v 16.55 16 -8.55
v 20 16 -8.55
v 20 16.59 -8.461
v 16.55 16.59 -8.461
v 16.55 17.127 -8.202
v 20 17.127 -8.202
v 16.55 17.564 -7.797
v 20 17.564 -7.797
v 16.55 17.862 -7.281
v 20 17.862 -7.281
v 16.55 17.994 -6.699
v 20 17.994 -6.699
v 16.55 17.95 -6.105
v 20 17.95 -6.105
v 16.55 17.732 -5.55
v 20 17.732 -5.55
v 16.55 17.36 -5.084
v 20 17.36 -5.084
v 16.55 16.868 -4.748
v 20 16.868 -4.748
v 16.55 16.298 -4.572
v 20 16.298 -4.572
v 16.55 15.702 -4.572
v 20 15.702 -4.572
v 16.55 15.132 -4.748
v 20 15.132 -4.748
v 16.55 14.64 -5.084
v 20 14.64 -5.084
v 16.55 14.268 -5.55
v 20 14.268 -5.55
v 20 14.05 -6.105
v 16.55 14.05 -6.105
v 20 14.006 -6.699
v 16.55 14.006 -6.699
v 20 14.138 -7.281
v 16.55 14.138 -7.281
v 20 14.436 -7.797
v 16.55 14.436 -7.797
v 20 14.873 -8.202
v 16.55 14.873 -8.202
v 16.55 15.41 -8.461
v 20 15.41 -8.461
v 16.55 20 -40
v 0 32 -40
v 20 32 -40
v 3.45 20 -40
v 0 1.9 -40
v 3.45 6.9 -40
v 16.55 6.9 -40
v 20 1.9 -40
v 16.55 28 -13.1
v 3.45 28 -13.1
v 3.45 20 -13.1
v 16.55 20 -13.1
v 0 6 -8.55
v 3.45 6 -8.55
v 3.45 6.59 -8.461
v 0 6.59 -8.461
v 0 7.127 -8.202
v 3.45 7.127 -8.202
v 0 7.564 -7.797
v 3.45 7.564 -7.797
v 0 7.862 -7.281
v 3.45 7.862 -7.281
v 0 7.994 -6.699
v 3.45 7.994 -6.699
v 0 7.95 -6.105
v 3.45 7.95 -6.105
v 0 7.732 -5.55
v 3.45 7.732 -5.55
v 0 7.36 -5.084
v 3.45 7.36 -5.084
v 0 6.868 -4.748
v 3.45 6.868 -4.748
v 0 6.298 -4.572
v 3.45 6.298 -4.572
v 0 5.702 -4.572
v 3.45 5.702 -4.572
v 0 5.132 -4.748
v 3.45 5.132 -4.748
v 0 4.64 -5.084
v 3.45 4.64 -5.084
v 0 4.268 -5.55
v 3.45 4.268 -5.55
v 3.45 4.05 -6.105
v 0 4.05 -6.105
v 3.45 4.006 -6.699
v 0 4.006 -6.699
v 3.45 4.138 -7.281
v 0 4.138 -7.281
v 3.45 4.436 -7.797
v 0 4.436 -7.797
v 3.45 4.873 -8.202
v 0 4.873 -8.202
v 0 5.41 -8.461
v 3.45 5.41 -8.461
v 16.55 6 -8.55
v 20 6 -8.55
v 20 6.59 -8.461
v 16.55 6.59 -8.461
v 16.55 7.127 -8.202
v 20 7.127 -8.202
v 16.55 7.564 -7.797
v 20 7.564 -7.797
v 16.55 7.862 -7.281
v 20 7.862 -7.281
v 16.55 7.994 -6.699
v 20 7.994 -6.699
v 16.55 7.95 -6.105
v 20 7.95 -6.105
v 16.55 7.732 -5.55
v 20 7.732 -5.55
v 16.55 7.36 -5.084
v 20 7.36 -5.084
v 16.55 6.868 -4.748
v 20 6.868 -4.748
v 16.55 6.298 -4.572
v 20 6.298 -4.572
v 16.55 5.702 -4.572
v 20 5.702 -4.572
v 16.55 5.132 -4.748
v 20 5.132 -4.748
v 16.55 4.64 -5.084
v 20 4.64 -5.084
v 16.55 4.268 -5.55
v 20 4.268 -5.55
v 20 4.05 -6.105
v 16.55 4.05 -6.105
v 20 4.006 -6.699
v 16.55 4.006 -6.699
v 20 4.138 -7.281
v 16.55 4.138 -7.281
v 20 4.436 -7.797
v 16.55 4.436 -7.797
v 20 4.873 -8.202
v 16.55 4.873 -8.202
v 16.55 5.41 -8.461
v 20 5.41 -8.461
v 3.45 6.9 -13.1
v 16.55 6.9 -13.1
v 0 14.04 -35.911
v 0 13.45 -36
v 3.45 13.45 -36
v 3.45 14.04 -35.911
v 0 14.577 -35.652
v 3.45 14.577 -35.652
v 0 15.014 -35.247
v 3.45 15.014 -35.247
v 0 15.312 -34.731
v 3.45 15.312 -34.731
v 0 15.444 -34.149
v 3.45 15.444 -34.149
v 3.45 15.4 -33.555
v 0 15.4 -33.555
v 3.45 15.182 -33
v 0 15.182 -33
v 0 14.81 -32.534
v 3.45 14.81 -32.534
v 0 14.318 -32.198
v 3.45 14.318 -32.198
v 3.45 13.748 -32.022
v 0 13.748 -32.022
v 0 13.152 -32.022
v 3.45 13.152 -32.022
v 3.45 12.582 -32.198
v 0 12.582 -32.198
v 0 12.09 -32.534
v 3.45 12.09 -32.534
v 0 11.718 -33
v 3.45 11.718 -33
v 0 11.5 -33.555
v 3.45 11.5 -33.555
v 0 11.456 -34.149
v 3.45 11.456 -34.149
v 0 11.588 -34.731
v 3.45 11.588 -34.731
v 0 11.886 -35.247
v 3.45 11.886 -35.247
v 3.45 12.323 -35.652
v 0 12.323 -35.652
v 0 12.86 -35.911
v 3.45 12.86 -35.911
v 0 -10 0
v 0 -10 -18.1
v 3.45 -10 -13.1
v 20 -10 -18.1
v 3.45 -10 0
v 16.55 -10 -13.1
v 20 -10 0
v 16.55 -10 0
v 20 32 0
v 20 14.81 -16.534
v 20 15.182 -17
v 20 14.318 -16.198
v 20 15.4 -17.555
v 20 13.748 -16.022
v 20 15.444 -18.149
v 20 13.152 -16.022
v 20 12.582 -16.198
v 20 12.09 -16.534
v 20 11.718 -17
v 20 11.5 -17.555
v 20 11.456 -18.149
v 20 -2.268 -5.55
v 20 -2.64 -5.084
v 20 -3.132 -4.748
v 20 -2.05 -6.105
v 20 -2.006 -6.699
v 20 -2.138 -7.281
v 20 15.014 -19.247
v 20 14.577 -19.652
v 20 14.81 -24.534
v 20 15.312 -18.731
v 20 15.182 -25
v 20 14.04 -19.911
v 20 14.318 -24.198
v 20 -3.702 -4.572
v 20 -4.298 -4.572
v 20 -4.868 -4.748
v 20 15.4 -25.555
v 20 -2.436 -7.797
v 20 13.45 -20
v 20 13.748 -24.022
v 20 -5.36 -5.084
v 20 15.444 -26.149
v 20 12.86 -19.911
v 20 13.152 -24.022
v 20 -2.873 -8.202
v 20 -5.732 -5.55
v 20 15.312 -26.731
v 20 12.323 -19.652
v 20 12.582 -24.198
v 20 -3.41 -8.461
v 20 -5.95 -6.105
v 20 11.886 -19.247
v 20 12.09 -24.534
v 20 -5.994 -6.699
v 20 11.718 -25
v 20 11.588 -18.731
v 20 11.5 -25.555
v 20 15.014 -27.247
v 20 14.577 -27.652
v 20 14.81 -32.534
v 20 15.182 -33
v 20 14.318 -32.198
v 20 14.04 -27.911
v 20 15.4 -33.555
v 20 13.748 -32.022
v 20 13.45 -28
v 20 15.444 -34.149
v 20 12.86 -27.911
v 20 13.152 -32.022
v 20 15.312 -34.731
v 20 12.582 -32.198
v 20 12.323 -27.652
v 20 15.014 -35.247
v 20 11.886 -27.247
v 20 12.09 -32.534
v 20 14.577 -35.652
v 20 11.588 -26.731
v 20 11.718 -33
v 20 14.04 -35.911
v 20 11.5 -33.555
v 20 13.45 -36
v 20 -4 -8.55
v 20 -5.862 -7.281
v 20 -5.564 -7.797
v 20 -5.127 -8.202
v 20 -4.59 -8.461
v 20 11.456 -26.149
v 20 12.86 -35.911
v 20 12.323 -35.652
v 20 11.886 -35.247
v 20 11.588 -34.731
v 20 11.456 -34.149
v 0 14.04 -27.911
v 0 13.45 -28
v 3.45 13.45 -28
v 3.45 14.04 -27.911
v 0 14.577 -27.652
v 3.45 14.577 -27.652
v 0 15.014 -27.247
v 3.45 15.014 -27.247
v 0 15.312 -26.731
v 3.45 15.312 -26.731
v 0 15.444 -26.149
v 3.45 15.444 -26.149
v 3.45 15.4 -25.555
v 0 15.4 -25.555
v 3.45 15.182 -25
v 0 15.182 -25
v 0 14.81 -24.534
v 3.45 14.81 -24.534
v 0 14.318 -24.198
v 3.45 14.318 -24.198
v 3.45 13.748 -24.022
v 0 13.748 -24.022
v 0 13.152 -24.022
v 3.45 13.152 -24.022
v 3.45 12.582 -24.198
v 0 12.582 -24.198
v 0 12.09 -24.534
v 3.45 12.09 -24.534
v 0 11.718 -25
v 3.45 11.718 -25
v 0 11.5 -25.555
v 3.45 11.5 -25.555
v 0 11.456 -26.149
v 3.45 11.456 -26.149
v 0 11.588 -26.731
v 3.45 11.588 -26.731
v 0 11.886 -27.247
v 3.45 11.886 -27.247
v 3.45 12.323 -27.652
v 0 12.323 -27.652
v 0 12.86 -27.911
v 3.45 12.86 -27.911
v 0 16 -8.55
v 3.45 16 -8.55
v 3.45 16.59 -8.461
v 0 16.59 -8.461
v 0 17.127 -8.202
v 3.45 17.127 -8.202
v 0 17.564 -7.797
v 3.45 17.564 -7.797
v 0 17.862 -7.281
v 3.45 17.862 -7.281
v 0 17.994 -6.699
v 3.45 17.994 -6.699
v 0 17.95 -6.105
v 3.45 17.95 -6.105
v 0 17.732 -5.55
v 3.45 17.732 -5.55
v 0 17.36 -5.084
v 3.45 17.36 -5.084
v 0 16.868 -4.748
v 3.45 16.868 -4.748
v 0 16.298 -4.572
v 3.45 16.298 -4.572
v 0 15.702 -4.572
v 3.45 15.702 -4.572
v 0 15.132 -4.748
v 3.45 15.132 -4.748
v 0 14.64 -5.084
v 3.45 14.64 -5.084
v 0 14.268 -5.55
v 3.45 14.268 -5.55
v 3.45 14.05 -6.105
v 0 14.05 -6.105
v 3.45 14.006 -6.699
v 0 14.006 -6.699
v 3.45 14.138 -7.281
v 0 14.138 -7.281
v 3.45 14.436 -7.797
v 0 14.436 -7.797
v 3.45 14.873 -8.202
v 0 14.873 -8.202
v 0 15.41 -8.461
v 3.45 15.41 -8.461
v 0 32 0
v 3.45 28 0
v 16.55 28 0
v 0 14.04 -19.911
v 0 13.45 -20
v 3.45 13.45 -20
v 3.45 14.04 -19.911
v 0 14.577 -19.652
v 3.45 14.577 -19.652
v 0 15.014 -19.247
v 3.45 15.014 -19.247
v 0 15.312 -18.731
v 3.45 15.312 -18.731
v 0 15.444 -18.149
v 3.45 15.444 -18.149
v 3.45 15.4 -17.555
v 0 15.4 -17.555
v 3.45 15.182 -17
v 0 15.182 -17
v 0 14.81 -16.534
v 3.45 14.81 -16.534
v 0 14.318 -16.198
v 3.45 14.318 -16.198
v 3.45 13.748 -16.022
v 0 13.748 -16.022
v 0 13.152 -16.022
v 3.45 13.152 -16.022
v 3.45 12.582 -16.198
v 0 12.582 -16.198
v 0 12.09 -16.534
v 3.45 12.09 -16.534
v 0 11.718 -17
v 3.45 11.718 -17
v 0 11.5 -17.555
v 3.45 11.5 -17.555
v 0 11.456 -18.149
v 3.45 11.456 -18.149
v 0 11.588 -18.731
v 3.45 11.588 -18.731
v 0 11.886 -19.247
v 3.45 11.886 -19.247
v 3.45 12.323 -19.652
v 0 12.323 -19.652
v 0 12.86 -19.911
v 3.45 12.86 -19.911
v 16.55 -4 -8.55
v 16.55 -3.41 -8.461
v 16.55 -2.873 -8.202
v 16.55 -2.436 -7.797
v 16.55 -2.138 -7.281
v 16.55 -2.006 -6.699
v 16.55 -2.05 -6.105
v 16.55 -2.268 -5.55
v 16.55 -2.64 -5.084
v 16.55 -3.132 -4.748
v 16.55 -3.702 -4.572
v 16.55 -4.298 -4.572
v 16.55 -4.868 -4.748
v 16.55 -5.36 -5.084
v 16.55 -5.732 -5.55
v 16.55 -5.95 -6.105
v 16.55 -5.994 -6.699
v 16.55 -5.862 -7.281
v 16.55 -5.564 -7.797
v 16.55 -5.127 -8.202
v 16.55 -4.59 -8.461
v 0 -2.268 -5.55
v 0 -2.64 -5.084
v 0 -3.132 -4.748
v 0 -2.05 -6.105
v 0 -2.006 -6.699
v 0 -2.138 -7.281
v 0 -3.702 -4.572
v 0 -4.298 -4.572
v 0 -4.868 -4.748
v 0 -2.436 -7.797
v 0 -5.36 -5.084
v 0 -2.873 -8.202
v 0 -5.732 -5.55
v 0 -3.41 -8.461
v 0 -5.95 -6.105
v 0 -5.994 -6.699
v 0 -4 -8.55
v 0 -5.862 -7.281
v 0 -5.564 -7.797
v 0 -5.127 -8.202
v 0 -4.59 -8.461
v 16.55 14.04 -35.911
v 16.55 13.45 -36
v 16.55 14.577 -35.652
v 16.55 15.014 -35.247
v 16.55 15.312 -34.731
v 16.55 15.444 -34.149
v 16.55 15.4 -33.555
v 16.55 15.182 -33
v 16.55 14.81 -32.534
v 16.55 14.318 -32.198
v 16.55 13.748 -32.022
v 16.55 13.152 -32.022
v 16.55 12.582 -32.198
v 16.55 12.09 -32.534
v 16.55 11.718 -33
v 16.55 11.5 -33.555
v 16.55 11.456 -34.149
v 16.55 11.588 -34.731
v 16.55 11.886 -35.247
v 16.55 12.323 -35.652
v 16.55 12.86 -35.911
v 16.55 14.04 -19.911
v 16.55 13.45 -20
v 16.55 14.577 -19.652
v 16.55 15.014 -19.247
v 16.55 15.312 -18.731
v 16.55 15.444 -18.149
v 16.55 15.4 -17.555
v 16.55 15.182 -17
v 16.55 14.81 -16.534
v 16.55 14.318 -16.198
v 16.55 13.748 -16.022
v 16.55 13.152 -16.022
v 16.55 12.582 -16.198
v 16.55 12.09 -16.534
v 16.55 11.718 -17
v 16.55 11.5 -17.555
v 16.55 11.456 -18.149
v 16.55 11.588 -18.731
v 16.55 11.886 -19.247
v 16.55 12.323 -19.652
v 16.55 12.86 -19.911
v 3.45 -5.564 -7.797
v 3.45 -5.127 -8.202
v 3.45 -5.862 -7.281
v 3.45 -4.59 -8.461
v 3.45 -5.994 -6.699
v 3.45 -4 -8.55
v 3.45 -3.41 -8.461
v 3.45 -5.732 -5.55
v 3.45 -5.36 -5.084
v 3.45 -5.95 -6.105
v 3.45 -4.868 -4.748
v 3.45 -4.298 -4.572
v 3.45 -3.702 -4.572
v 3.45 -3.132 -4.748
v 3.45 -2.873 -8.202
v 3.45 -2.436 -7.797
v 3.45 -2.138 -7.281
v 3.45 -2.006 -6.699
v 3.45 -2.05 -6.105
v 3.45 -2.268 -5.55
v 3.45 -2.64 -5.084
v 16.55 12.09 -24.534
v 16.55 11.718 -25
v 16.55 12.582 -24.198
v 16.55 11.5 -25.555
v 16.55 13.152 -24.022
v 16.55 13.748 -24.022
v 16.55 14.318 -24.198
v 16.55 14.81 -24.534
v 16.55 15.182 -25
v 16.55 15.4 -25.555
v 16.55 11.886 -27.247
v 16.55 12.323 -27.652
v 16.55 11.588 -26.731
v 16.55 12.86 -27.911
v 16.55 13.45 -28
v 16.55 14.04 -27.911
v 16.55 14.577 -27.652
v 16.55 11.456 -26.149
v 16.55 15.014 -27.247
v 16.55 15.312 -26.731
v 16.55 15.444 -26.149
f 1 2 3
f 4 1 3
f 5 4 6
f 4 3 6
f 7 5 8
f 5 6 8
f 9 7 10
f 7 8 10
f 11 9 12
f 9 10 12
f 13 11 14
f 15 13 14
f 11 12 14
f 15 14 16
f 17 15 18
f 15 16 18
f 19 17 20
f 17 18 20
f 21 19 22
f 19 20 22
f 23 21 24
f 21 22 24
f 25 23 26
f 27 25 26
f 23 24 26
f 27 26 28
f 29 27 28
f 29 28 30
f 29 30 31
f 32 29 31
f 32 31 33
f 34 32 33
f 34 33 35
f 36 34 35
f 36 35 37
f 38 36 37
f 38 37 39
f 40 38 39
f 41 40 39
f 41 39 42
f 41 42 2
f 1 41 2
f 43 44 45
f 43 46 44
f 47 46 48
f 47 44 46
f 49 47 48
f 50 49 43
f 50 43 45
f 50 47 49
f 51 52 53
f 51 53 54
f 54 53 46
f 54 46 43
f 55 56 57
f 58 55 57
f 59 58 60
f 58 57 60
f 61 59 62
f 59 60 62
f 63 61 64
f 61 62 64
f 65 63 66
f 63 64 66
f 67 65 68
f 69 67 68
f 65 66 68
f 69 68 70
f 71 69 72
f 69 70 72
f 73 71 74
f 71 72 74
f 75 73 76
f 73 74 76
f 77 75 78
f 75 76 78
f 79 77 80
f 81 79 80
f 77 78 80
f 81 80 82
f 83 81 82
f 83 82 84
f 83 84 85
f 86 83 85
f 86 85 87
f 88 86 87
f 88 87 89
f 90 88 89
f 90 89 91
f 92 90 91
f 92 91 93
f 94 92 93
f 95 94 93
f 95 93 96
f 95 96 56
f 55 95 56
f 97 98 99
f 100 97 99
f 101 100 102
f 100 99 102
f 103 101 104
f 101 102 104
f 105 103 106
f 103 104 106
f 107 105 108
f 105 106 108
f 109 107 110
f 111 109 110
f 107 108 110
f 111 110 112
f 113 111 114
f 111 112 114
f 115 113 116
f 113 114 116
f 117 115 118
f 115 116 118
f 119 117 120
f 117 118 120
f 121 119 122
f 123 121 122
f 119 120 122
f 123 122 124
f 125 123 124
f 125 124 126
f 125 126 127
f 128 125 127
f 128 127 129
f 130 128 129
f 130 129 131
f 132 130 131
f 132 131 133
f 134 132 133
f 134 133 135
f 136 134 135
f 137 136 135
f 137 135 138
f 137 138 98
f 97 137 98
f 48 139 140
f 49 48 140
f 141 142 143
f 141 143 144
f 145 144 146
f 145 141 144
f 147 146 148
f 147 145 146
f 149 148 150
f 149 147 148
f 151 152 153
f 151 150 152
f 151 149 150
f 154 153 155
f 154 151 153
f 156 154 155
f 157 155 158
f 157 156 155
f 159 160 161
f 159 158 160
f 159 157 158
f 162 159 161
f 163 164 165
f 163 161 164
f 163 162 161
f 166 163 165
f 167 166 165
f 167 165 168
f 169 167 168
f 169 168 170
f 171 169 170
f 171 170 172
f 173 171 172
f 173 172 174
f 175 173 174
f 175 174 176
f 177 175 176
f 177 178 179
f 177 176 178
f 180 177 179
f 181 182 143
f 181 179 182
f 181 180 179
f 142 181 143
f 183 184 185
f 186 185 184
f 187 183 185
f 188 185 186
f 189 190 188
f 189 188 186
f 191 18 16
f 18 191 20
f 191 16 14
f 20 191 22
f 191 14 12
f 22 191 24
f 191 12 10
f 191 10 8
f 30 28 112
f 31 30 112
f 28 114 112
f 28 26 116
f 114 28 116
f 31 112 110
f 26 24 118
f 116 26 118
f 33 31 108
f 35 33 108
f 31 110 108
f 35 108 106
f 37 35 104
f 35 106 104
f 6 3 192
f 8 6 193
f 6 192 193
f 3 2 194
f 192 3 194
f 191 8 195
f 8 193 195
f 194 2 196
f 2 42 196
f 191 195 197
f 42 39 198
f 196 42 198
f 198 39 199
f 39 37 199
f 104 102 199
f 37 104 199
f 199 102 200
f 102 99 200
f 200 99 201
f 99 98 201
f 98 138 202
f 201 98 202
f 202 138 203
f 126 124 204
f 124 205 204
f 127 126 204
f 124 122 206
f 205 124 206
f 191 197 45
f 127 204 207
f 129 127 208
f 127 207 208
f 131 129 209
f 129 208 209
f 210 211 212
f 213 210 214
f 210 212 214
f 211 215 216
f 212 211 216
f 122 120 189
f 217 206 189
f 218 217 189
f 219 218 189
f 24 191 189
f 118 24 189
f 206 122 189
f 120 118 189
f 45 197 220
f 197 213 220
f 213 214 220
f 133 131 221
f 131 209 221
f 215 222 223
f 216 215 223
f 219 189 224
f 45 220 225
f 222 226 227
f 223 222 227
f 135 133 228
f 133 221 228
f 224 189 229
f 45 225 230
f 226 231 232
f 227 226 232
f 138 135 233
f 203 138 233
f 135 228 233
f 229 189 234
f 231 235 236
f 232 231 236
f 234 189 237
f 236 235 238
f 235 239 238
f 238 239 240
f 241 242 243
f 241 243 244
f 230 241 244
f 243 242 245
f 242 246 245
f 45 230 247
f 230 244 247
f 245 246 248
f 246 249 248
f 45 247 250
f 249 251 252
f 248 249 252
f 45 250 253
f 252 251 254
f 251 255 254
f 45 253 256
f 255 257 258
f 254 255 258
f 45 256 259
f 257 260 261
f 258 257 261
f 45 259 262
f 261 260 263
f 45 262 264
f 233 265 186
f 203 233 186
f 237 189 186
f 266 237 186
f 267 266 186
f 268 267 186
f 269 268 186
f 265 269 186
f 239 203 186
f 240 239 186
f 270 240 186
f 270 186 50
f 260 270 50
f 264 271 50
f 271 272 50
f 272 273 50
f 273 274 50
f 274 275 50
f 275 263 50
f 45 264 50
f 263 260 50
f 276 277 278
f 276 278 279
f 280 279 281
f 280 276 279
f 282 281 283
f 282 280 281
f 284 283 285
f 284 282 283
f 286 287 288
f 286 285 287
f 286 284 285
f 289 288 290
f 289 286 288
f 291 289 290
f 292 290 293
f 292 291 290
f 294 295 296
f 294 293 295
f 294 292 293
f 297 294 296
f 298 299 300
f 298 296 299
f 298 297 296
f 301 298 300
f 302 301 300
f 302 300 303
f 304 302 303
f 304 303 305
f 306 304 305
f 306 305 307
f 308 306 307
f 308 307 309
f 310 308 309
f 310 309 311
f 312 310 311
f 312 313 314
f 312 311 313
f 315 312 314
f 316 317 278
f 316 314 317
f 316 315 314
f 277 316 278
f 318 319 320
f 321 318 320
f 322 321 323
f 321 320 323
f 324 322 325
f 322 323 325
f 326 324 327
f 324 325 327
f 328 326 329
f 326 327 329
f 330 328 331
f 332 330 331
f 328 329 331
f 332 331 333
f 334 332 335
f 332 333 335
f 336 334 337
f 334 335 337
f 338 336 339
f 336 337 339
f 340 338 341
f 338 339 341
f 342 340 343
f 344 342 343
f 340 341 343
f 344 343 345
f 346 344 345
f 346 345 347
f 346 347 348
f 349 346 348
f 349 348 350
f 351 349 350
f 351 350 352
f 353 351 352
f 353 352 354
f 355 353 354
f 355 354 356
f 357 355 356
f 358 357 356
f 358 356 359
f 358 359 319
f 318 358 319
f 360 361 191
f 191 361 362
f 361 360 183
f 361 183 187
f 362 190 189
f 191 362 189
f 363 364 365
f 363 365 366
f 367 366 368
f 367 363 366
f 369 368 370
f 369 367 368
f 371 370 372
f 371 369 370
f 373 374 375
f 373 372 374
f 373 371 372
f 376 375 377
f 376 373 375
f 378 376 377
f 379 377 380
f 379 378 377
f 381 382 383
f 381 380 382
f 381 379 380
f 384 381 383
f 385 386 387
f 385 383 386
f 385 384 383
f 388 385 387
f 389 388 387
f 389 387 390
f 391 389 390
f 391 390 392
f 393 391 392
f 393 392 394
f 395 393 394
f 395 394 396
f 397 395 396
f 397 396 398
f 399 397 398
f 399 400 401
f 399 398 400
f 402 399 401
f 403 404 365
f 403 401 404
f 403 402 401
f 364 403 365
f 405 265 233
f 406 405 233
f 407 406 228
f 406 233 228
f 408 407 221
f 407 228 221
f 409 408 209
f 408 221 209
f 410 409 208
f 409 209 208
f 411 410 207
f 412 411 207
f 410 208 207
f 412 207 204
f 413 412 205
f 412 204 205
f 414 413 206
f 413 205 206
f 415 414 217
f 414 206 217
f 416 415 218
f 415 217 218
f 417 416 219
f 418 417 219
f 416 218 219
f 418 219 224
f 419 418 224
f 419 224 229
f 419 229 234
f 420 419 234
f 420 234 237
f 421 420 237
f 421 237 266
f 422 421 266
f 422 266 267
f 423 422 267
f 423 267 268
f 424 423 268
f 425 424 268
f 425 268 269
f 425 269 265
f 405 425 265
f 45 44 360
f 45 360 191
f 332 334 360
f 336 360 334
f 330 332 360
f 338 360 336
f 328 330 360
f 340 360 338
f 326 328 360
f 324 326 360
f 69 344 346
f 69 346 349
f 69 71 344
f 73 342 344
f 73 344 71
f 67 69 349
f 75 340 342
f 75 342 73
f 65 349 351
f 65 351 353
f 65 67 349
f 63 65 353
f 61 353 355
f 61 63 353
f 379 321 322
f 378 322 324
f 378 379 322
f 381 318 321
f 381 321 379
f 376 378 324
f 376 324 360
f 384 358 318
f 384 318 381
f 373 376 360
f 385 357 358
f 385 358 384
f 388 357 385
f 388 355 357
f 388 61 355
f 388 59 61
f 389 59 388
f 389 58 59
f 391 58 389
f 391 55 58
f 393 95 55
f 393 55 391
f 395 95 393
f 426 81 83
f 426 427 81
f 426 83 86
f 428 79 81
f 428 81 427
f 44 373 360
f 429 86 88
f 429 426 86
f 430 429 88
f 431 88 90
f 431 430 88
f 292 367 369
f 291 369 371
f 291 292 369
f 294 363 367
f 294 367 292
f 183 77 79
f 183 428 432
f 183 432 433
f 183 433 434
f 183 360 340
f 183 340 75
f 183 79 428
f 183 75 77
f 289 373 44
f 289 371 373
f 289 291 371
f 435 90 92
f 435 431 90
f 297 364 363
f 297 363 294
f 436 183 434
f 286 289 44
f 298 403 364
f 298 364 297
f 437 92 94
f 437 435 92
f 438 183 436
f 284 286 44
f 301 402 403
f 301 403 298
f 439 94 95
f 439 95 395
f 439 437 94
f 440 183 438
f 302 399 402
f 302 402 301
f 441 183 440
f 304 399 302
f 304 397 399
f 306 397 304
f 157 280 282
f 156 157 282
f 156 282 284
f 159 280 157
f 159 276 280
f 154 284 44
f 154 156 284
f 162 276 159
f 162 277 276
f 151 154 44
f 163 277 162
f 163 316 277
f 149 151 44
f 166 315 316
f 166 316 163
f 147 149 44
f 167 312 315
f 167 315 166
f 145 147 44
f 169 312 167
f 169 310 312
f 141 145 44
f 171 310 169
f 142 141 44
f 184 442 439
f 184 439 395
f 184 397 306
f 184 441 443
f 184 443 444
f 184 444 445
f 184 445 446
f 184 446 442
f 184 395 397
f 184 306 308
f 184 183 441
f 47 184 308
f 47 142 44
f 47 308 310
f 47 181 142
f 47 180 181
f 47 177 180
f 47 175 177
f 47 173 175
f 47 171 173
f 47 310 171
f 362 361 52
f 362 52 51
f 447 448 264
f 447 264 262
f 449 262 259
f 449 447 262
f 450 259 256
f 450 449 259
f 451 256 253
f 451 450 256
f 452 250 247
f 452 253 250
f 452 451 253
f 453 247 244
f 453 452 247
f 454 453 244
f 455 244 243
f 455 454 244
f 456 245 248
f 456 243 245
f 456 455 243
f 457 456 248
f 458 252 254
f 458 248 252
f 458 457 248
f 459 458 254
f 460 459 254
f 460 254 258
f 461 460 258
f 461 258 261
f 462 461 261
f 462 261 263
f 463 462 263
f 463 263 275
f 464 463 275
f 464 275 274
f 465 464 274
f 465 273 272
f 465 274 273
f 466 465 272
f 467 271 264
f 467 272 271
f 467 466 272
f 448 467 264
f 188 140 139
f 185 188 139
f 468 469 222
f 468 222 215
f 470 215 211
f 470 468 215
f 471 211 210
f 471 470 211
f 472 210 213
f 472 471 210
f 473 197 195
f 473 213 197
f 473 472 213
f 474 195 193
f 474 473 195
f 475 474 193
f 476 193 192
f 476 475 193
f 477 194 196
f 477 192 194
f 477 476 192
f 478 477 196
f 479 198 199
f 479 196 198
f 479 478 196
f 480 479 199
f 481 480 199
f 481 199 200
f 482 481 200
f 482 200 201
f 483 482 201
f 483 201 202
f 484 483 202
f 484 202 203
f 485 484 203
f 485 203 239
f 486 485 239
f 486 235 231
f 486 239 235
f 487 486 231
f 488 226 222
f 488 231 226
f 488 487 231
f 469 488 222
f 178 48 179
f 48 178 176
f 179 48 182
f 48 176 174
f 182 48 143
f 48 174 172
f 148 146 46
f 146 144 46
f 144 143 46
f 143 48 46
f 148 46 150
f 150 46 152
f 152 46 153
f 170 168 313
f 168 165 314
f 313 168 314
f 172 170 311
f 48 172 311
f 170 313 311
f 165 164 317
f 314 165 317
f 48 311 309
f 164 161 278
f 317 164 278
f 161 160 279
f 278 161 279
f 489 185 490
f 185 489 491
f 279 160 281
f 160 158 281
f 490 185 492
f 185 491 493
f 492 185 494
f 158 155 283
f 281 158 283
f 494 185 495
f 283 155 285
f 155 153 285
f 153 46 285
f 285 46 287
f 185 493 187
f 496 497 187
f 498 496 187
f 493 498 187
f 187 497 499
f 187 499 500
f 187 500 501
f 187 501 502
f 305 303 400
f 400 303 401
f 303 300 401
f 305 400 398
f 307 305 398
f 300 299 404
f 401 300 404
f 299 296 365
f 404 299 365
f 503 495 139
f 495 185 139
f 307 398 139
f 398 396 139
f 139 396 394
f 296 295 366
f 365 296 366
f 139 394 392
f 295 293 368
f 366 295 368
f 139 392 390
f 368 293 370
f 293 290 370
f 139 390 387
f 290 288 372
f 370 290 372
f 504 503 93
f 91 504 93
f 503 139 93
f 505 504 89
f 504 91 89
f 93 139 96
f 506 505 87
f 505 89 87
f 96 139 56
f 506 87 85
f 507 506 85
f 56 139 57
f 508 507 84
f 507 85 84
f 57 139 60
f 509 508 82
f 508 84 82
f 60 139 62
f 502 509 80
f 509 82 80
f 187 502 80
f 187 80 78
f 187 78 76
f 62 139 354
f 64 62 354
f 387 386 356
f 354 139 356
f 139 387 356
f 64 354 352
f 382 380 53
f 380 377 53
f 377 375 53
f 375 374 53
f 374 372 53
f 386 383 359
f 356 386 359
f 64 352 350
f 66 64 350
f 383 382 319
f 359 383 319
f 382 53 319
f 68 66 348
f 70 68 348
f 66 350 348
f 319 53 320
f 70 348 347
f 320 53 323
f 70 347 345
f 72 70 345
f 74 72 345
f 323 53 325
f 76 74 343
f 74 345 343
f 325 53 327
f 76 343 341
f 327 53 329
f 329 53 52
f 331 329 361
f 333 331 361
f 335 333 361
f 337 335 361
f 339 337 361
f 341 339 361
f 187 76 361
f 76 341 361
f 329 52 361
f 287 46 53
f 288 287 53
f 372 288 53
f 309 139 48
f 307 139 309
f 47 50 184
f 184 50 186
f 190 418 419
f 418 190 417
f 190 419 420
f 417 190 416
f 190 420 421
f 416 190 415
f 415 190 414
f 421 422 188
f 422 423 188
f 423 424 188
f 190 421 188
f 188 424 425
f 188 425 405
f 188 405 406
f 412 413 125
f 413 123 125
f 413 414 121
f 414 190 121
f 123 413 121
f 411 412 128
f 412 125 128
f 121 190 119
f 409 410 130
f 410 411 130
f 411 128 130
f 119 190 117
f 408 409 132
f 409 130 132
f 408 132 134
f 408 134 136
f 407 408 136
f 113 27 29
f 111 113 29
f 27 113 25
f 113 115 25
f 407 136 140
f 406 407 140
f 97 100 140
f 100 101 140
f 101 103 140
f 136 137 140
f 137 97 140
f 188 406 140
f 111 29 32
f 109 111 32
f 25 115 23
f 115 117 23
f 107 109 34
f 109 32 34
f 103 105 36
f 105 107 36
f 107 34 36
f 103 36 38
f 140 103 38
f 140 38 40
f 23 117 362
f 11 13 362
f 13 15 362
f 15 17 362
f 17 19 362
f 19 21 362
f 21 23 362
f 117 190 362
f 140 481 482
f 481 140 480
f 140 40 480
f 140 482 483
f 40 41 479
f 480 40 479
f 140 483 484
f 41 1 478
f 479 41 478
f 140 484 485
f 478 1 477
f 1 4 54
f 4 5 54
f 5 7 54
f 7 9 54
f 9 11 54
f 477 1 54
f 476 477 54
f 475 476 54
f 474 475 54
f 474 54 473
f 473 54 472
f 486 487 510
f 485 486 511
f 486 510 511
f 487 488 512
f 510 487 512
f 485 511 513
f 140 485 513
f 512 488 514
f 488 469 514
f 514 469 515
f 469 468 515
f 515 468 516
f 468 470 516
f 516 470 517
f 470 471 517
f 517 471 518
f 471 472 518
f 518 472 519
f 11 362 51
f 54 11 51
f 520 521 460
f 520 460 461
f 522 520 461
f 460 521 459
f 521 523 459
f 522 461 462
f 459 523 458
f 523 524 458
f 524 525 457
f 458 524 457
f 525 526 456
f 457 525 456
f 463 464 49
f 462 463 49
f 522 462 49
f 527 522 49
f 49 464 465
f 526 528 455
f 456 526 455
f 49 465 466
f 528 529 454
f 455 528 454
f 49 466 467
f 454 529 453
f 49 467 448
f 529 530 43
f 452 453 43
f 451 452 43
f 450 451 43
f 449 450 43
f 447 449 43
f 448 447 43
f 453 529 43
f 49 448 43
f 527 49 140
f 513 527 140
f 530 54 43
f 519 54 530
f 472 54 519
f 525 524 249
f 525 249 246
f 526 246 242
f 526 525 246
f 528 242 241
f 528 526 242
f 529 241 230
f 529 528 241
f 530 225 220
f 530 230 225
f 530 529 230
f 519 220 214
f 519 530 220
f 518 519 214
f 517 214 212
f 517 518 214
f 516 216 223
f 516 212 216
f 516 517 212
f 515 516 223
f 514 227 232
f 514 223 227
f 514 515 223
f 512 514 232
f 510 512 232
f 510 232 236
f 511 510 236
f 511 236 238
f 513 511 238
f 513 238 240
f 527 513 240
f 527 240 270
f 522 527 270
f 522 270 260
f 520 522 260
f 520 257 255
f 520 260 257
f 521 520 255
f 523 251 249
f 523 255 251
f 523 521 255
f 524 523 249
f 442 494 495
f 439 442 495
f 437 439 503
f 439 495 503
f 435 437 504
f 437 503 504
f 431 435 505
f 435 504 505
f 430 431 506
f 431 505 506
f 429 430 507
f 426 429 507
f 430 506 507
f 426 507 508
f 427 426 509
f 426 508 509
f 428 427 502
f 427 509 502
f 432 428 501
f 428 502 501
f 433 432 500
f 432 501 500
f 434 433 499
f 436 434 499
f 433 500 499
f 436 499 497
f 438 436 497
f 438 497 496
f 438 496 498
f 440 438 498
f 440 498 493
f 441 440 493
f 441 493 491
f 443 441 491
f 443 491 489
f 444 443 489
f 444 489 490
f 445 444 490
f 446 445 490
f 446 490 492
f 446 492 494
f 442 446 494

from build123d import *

# Parameters (mm, degrees)
SKETCH1_W               = 20
SKETCH1_H               = 40
BOSS_EXTRUDE1_DEPTH     = 20
SKETCH2_W               = 13.1
SKETCH2_H               = 13.1
CUT_EXTRUDE1_DEPTH      = 49.989794856
SKETCH3_W               = 13.1
SKETCH3_H               = 13.1
CUT_EXTRUDE2_DEPTH      = 40.033447196
BOSS_EXTRUDE2_DEPTH     = 10
SKETCH5_W               = 20
SKETCH5_H               = 40
BOSS_EXTRUDE3_DEPTH     = 12
SKETCH6_W               = 13.1
SKETCH6_H               = 8
CUT_EXTRUDE3_DEPTH      = 13.1
SKETCH7_R               = 2
CUT_EXTRUDE4_DEPTH      = 55.990908339
CUT_EXTRUDE5_DEPTH      = 54.83216975
CUT_EXTRUDE5_DEPTH_BACK = 54.83216975
SKETCH8_R               = 2
CUT_EXTRUDE6_DEPTH      = 55.990908339


with BuildPart() as part:
    # Sketch1 → Boss-Extrude1 (new body)
    with BuildSketch(Plane(origin=(0, 0, 0), x_dir=(1, 0, 0), z_dir=(0, 1, 0))):
        with Locations((10, 20)):
            Rectangle(SKETCH1_W, SKETCH1_H)
    extrude(amount=BOSS_EXTRUDE1_DEPTH)

    # Sketch2 → Cut-Extrude1 (cut, through all)
    with BuildSketch(Plane(origin=(0, 20, 0), x_dir=(1, 0, 0), z_dir=(0, 1, 0))):
        with Locations((10, 6.55)):
            Rectangle(SKETCH2_W, SKETCH2_H)
    extrude(amount=-CUT_EXTRUDE1_DEPTH, mode=Mode.SUBTRACT)

    # Sketch3 → Cut-Extrude2 (cut, through all)
    with BuildSketch(Plane.XY.offset(-13.1)):
        with Locations((10, 13.45)):
            Rectangle(SKETCH3_W, SKETCH3_H)
    extrude(amount=-CUT_EXTRUDE2_DEPTH, mode=Mode.SUBTRACT)

    # Sketch4 → Boss-Extrude2 (add)
    with BuildSketch(Plane.XZ):
        Polygon((3.45, -13.1), (3.45, 0), (0, 0), (0, -40), (20, -40), (20, 0), (16.55, 0), (16.55, -13.1), align=None)
    extrude(amount=BOSS_EXTRUDE2_DEPTH)

    # Sketch5 → Boss-Extrude3 (add)
    with BuildSketch(Plane(origin=(0, 20, 0), x_dir=(1, 0, 0), z_dir=(0, 1, 0))):
        with Locations((10, 20)):
            Rectangle(SKETCH5_W, SKETCH5_H)
    extrude(amount=BOSS_EXTRUDE3_DEPTH)

    # Sketch6 → Cut-Extrude3 (cut)
    with BuildSketch(Plane.XY):
        with Locations((10, 24)):
            Rectangle(SKETCH6_W, SKETCH6_H)
    extrude(amount=-CUT_EXTRUDE3_DEPTH, mode=Mode.SUBTRACT)

    # Sketch7 → Cut-Extrude4 (cut, through all)
    with BuildSketch(Plane(origin=(20, 0, 0), x_dir=(0, 0, -1), z_dir=(1, 0, 0))):
        with Locations((6.55, -4)):
            Circle(SKETCH7_R)
        with Locations((6.55, 16)):
            Circle(SKETCH7_R)
        with Locations((6.55, 6)):
            Circle(SKETCH7_R)
    extrude(amount=-CUT_EXTRUDE4_DEPTH, mode=Mode.SUBTRACT)

    # Sketch8 → Cut-Extrude5 (cut, two sides: drawn at the far end of the back side and taken through both)
    with BuildSketch(Plane(origin=(3.45, 0, 0), x_dir=(0, 0, -1), z_dir=(1, 0, 0)).offset(-CUT_EXTRUDE5_DEPTH_BACK)):
        with Locations((34, 13.45)):
            Circle(SKETCH8_R)
        with Locations((26, 13.45)):
            Circle(SKETCH8_R)
        with Locations((18, 13.45)):
            Circle(SKETCH8_R)
    extrude(amount=CUT_EXTRUDE5_DEPTH + CUT_EXTRUDE5_DEPTH_BACK, mode=Mode.SUBTRACT)

    # Sketch9 → Cut-Extrude6 (cut, through all)
    with BuildSketch(Plane(origin=(20, 0, 0), x_dir=(0, 0, -1), z_dir=(1, 0, 0))):
        Polygon((18.1, -10), (40, -10), (40, 1.9), align=None)
    extrude(amount=-CUT_EXTRUDE6_DEPTH, mode=Mode.SUBTRACT)


solid = part.part
